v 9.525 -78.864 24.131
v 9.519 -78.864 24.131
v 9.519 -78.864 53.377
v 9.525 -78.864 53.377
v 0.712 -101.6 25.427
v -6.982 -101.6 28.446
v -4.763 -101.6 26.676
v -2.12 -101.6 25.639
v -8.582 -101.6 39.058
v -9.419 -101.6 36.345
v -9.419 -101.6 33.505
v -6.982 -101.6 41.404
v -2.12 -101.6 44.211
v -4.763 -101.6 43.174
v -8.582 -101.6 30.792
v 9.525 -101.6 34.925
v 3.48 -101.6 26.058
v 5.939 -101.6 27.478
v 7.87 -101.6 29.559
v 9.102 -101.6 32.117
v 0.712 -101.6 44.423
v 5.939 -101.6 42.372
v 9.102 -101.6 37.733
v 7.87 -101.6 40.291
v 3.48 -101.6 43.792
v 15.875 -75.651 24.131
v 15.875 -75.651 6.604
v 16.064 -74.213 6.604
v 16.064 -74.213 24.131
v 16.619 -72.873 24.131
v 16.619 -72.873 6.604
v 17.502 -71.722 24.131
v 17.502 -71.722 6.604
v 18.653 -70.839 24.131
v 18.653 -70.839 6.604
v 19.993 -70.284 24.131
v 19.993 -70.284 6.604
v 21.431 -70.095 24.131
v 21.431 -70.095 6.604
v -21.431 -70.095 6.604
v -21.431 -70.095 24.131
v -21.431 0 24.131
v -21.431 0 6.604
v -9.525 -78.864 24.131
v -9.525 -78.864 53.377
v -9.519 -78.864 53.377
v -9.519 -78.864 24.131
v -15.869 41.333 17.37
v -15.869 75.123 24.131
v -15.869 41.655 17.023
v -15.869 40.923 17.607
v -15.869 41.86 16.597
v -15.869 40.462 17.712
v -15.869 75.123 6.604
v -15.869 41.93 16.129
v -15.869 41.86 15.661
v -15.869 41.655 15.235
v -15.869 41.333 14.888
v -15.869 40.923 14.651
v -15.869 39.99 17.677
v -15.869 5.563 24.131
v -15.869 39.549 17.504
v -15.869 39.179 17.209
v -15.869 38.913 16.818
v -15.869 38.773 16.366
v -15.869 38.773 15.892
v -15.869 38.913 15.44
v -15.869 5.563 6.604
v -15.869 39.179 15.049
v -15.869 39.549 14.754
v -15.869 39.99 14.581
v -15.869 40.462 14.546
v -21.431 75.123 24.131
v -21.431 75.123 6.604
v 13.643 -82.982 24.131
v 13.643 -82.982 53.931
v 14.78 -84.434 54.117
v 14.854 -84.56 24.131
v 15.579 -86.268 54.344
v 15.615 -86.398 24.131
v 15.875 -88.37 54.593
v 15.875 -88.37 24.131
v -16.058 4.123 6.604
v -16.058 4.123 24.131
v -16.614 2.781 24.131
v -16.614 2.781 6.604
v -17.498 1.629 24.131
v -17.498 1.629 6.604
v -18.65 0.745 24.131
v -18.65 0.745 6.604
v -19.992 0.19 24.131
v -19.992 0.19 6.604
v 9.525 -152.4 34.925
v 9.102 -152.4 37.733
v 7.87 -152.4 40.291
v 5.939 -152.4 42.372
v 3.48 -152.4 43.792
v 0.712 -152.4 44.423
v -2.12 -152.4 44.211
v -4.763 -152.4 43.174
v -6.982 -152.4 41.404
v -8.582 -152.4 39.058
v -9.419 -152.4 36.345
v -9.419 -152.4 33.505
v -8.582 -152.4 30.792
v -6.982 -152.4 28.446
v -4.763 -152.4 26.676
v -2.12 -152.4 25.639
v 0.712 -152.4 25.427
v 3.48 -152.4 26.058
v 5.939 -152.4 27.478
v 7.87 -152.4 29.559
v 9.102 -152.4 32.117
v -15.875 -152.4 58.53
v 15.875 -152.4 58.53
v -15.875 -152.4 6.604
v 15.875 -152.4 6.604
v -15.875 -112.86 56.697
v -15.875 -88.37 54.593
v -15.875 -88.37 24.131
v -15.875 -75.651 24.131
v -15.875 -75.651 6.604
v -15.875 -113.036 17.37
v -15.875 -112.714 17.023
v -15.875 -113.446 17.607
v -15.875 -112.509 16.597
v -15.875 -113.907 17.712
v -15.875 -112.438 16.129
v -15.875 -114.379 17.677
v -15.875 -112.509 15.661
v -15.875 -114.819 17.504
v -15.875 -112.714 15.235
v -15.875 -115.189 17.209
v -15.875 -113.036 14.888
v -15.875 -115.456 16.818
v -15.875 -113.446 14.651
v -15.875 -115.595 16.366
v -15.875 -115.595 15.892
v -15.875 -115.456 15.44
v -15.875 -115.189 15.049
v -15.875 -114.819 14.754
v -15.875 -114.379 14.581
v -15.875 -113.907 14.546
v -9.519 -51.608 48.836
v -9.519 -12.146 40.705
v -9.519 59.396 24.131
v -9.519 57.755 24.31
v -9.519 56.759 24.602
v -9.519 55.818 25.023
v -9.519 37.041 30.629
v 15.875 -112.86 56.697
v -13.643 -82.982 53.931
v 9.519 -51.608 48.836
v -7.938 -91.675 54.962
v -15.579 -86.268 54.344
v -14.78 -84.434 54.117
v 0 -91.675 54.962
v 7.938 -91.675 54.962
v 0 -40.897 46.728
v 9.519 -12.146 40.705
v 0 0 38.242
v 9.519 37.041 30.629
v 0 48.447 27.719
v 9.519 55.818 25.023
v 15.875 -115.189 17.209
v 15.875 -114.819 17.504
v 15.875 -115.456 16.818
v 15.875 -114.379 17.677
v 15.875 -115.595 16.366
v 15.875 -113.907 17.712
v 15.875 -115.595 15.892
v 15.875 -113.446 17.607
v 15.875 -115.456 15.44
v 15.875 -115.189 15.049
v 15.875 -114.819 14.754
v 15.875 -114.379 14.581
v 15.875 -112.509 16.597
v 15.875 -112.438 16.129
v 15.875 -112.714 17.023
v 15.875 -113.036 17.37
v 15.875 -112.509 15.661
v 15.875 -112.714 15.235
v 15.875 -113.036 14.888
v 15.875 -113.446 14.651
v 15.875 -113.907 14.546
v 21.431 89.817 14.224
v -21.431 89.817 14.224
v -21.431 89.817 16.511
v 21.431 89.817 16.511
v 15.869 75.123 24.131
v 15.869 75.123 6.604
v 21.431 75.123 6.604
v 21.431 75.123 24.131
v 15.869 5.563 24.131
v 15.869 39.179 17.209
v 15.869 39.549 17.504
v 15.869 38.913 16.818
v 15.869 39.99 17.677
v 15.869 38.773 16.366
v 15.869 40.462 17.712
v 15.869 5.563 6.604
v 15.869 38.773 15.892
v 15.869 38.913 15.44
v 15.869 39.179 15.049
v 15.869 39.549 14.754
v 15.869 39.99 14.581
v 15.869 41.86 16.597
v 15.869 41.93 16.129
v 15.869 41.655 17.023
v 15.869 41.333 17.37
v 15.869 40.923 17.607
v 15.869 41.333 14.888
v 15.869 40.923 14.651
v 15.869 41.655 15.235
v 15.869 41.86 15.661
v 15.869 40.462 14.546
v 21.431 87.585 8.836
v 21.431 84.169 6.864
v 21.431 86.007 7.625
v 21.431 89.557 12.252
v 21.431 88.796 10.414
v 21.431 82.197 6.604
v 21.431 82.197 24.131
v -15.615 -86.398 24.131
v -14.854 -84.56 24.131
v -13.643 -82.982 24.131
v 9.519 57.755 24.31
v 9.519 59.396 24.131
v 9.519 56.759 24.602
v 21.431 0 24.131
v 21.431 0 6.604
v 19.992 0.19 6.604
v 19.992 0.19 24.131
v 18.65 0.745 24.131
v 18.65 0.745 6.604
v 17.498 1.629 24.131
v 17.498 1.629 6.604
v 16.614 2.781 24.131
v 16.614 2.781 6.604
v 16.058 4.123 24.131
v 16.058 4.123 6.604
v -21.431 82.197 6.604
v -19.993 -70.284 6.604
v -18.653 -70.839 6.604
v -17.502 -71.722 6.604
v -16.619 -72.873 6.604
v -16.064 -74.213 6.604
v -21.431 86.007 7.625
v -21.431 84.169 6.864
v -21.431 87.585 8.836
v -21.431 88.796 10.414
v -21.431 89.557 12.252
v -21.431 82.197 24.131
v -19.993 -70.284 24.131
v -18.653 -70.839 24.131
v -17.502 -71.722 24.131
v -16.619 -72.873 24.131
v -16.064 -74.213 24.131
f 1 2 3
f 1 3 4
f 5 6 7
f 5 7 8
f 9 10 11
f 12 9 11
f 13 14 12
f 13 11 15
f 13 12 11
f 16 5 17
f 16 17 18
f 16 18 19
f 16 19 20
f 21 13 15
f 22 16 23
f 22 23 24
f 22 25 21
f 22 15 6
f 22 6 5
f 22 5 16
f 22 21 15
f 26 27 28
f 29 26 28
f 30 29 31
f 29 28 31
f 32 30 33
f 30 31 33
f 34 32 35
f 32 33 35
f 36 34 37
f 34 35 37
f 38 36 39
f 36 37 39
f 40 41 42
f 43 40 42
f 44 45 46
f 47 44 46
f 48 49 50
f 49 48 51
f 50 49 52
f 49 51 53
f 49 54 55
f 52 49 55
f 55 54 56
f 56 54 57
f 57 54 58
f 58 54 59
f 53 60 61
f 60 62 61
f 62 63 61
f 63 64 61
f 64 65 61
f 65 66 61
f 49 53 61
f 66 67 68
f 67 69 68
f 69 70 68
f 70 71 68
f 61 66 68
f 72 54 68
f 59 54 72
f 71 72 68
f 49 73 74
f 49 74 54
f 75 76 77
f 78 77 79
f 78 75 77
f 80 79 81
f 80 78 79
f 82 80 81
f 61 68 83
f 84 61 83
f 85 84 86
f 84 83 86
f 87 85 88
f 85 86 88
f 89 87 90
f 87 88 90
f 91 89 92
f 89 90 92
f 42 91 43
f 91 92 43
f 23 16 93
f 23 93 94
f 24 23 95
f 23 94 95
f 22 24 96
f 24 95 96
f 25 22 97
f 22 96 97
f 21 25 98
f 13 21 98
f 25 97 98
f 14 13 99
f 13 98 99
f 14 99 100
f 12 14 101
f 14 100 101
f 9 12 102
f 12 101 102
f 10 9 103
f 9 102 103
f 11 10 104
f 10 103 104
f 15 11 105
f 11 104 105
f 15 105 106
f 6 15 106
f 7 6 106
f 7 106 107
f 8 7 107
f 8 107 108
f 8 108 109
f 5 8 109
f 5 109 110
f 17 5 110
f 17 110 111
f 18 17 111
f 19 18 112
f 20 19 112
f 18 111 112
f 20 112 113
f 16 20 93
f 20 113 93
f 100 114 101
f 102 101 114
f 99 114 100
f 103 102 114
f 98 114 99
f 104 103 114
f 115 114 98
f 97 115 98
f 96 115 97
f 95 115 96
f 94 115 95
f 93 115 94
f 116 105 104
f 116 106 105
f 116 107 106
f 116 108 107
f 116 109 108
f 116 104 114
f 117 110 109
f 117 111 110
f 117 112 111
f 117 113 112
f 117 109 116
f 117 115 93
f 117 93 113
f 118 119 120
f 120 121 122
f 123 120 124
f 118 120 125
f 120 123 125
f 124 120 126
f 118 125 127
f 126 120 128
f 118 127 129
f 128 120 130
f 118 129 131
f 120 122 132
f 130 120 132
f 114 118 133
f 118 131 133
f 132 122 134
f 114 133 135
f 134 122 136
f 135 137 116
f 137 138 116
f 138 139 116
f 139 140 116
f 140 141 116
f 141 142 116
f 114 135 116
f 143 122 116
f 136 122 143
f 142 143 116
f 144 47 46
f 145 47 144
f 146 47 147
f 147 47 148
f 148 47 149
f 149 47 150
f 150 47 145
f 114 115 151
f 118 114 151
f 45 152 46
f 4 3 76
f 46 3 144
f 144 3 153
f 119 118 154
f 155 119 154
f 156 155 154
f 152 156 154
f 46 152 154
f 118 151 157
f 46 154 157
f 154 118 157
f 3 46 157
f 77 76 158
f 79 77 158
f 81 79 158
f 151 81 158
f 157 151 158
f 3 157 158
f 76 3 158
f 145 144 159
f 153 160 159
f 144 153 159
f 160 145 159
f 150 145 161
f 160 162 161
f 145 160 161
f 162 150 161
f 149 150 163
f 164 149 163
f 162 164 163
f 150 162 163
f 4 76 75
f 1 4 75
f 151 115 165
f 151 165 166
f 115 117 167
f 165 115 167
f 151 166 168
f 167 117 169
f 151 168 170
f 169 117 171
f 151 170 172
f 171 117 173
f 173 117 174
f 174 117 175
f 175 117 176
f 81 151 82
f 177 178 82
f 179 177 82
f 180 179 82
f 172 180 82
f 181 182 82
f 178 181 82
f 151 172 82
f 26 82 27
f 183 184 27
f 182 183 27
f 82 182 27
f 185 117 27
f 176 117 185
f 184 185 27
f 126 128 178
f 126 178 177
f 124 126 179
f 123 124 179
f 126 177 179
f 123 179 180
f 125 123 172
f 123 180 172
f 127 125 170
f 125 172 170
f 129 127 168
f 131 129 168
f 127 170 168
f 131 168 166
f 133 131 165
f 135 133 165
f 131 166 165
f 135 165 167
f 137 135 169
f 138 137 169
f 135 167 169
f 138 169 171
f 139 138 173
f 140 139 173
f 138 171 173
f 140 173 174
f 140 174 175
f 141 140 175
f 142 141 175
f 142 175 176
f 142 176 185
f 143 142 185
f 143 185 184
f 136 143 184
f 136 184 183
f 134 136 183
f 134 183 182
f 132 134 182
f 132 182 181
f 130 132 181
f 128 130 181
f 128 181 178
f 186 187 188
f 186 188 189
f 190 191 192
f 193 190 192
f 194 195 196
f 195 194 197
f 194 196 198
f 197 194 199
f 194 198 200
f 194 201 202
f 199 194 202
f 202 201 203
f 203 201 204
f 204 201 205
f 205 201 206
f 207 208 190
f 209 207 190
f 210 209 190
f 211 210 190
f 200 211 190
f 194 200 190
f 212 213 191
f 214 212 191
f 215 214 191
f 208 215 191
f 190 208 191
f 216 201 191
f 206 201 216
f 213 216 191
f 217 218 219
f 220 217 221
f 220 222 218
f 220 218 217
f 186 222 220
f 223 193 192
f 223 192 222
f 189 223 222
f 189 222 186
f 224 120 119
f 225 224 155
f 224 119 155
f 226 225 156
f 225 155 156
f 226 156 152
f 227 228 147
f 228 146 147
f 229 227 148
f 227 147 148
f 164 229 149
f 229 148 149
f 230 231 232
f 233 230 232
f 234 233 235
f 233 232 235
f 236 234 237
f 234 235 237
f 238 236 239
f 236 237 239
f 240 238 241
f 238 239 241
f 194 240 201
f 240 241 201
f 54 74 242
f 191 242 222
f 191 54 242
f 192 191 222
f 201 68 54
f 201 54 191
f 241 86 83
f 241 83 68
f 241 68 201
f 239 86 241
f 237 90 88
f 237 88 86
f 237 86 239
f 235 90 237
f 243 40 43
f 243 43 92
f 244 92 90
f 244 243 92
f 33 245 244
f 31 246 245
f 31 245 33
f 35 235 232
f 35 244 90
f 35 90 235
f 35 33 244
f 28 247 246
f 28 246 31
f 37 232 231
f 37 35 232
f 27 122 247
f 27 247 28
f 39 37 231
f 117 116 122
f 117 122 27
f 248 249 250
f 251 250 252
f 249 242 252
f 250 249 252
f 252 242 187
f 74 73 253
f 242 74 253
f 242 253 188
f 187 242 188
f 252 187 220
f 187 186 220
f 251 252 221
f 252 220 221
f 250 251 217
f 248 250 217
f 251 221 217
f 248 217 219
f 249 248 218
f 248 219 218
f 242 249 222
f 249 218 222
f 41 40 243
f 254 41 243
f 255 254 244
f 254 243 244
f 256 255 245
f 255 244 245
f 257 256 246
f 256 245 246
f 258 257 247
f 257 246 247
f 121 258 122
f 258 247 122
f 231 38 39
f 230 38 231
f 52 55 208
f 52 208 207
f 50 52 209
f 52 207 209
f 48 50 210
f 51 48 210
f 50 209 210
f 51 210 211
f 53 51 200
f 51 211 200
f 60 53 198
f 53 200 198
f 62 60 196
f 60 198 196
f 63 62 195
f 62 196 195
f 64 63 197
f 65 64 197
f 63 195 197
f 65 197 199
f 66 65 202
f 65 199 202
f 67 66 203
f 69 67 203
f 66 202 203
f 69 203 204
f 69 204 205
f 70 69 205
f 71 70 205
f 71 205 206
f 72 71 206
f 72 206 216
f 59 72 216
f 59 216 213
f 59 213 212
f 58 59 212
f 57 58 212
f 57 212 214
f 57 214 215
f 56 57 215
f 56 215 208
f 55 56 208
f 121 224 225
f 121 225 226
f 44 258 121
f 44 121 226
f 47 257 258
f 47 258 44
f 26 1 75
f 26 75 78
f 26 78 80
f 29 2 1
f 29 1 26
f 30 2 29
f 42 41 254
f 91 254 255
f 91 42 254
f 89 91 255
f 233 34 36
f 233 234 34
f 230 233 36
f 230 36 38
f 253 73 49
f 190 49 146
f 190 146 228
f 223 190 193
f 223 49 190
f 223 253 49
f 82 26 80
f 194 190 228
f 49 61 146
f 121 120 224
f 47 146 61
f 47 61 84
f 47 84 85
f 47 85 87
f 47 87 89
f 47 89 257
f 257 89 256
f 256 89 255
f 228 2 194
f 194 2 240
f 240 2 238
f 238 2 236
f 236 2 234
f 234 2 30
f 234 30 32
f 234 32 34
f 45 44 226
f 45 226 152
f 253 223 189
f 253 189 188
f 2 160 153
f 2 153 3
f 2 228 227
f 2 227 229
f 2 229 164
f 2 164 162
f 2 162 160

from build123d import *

# Parameters (mm, degrees)
F1_DEPTH  = 21.43125
F2_R      = 9.525
F3_DEPTH  = 50.8
F5_W      = 42.8625
F5_H      = 62.5831912994
F7_DEPTH  = 117.856
F8_W      = 5.55625
F8_H      = 69.85
F9_DEPTH  = 25.4
F10_DEPTH = 78.232
F12_DEPTH = 65.786
F14_DEPTH = 70.104
F16_DEPTH = 6.604
F17_SIZE  = 7.62
F18_R     = 7.62
F19_SIZE  = 6.35
F20_R     = 7.62
F21_R     = 1.5875
F22_DEPTH = 32.258
F23_R     = 1.5875
F24_DEPTH = 36.068


with BuildPart() as f1:
    # F0 (on Right) → F1 (new body, symmetric)
    with BuildSketch(Plane.YZ):
        Polygon((-152.4, 69.85), (-152.4, 0), (152.4, 0), (152.4, 19.05), align=None)
    extrude(amount=F1_DEPTH, both=True)

    # F2 (on face) → F3 (cut)
    with BuildSketch(Plane.XZ.offset(152.4)):
        with Locations((0, 34.925)):
            Circle(F2_R)
    extrude(amount=-F3_DEPTH, mode=Mode.SUBTRACT)

    # F5 (on face) → F7 (cut)
    with BuildSketch(Plane(origin=(0, 0, 0), x_dir=(1, 0, 0), z_dir=(0, 0, -1))):
        with BuildLine():
            Line((-15.875, 75.6509676576), (-15.875, 95.25))
            Line((-15.875, 95.25), (-15.875, 152.4))
            Line((-15.875, 152.4), (-21.43125, 152.1471400823))
            Line((-21.43125, 152.1471400823), (-21.43125, 70.0947176576))
            ThreePointArc((-21.43125, 70.0947176576), (-17.502387947, 71.7221056046), (-15.875, 75.6509676576))
        make_face()
        with BuildLine():
            Line((15.86865, -75.1233920455), (21.43125, -75.1233920455))
            Line((21.43125, -75.1233920455), (21.43125, -5.5626))
            Line((21.43125, -5.5626), (21.43125, 0))
            ThreePointArc((21.43125, 0), (17.497897819, -1.629247819), (15.86865, -5.5626))
            Line((15.86865, -5.5626), (15.86865, -43.3772839606))
            Line((15.86865, -43.3772839606), (15.86865, -75.1233920455))
        make_face()
        with Locations((0, -121.1084043503)):
            Rectangle(F5_W, F5_H)
        with BuildLine():
            ThreePointArc((-15.86865, -5.5626), (-17.497897819, -1.629247819), (-21.43125, 0))
            Line((-21.43125, 0), (-21.43125, -75.1233920455))
            Line((-21.43125, -75.1233920455), (-15.86865, -75.1233920455))
            Line((-15.86865, -75.1233920455), (-15.86865, -43.3772839606))
            Line((-15.86865, -43.3772839606), (-15.86865, -5.5626))
        make_face()
        with BuildLine():
            Line((21.43125, 152.4), (15.875, 152.4))
            Line((15.875, 152.4), (15.875, 95.25))
            Line((15.875, 95.25), (15.875, 75.6509676576))
            ThreePointArc((15.875, 75.6509676576), (17.502387947, 71.7221056046), (21.43125, 70.0947176576))
            Line((21.43125, 70.0947176576), (21.43125, 152.4))
        make_face()
    extrude(amount=-F7_DEPTH, mode=Mode.SUBTRACT)

    # F8 (on face) → F9 (cut)
    with BuildSketch(Plane.XZ.offset(152.4)):
        with Locations((-18.653125, 34.925)):
            Rectangle(F8_W, F8_H)
    extrude(amount=-F9_DEPTH, mode=Mode.SUBTRACT)

    # F4 (on face) → F10 (cut)
    with BuildSketch(Plane.YZ.offset(21.43125)):
        with BuildLine():
            Line((-166.5327996016, 95.561735332), (-152.4, 58.5300065577))
            add(Edge.make_bspline(
                [(-152.4, 58.5300065577), (-131.9690523131, 57.5975989918), (-92.9028985073, 56.6319201488), (-39.12835213, 46.6520301008), (-5.7136492039, 39.0230650087), (52.8600042471, 28.1535812859), (57.15, 24.1312850267)],
                knots=[0, 0, 0, 0, 0.2679549114, 0.514366781, 0.7364046279, 1, 1, 1, 1], degree=3))
            Line((57.15, 24.1312850267), (166.3713157177, 24.1312850267))
            Line((166.3713157177, 24.1312850267), (-166.5327996016, 95.561735332))
        make_face()
    extrude(amount=-F10_DEPTH, mode=Mode.SUBTRACT)

    # F11 (on face) → F12 (cut)
    with BuildSketch(Plane.XY.offset(24.1312850267)):
        Polygon((26.5305805951, 75.1233920455), (15.86865, 75.1233920455), (9.51865, 75.1233920455), (9.51865, -78.8636729121), (26.5305805951, -78.8636729121), align=None)
    extrude(amount=F12_DEPTH, mode=Mode.SUBTRACT)

    # F13 (on face) → F14 (cut)
    with BuildSketch(Plane.XY.offset(24.1312850267)):
        Polygon((-9.51865, 57.15), (-15.86865, 57.15), (-28.360279277, 57.15), (-37.0513312519, -78.8636729121), (-9.51865, -78.8636729121), align=None)
    extrude(amount=F14_DEPTH, mode=Mode.SUBTRACT)

    # F6 (on face) → F16 (cut)
    with BuildSketch(Plane(origin=(0, 0, 0), x_dir=(1, 0, 0), z_dir=(0, 0, -1))):
        with BuildLine():
            Line((15.875, 75.6509676576), (15.875, 95.25))
            Line((15.875, 95.25), (15.875, 152.4))
            Line((15.875, 152.4), (-15.875, 152.4))
            Line((-15.875, 152.4), (-15.875, 95.25))
            Line((-15.875, 95.25), (-15.875, 75.6509676576))
            ThreePointArc((-15.875, 75.6509676576), (-17.502387947, 71.7221056046), (-21.43125, 70.0947176576))
            Line((-21.43125, 70.0947176576), (-21.43125, 0))
            ThreePointArc((-21.43125, 0), (-17.497897819, -1.629247819), (-15.86865, -5.5626))
            Line((-15.86865, -5.5626), (-15.86865, -43.3772839606))
            Line((-15.86865, -43.3772839606), (-15.86865, -75.1233920455))
            Line((-15.86865, -75.1233920455), (-21.43125, -75.1233920455))
            Line((-21.43125, -75.1233920455), (-21.43125, -89.8168087006))
            Line((-21.43125, -89.8168087006), (21.43125, -89.8168087006))
            Line((21.43125, -89.8168087006), (21.43125, -75.1233920455))
            Line((21.43125, -75.1233920455), (15.86865, -75.1233920455))
            Line((15.86865, -75.1233920455), (15.86865, -43.3772839606))
            Line((15.86865, -43.3772839606), (15.86865, -5.5626))
            ThreePointArc((15.86865, -5.5626), (17.497897819, -1.629247819), (21.43125, 0))
            Line((21.43125, 0), (21.43125, 70.0947176576))
            ThreePointArc((21.43125, 70.0947176576), (17.502387947, 71.7221056046), (15.875, 75.6509676576))
        make_face()
    extrude(amount=-F16_DEPTH, mode=Mode.SUBTRACT)

    # F17
    f17_edges = [f1.edges().sort_by_distance(p)[0] for p in [
        (0, 89.816809, 24.131285),
    ]]
    chamfer(f17_edges, length=F17_SIZE)

    # F18
    f18_edges = [f1.edges().sort_by_distance(p)[0] for p in [
        (0, 89.816809, 6.604),
        (0, 57.15, 24.131285),
    ]]
    fillet(f18_edges, radius=F18_R)

    # F19
    f19_edges = [f1.edges().sort_by_distance(p)[0] for p in [
        (-15.875, -78.863673, 38.753924),
        (15.875, -78.863673, 38.753924),
    ]]
    chamfer(f19_edges, length=F19_SIZE)

    # F20
    f20_edges = [f1.edges().sort_by_distance(p)[0] for p in [
        (-15.875, -85.213673, 39.172756),
        (15.875, -85.213673, 39.172756),
    ]]
    fillet(f20_edges, radius=F20_R)

    # F21 (on face) → F22 (cut)
    with BuildSketch(Plane.YZ.offset(15.875)):
        with Locations((-114.0254838288, 16.129)):
            Circle(F21_R)
    extrude(amount=-F22_DEPTH, mode=Mode.SUBTRACT)

    # F23 (on face) → F24 (cut)
    with BuildSketch(Plane.YZ.offset(15.86865)):
        with Locations((40.3429960227, 16.129)):
            Circle(F23_R)
    extrude(amount=-F24_DEPTH, mode=Mode.SUBTRACT)


solid = f1.part
